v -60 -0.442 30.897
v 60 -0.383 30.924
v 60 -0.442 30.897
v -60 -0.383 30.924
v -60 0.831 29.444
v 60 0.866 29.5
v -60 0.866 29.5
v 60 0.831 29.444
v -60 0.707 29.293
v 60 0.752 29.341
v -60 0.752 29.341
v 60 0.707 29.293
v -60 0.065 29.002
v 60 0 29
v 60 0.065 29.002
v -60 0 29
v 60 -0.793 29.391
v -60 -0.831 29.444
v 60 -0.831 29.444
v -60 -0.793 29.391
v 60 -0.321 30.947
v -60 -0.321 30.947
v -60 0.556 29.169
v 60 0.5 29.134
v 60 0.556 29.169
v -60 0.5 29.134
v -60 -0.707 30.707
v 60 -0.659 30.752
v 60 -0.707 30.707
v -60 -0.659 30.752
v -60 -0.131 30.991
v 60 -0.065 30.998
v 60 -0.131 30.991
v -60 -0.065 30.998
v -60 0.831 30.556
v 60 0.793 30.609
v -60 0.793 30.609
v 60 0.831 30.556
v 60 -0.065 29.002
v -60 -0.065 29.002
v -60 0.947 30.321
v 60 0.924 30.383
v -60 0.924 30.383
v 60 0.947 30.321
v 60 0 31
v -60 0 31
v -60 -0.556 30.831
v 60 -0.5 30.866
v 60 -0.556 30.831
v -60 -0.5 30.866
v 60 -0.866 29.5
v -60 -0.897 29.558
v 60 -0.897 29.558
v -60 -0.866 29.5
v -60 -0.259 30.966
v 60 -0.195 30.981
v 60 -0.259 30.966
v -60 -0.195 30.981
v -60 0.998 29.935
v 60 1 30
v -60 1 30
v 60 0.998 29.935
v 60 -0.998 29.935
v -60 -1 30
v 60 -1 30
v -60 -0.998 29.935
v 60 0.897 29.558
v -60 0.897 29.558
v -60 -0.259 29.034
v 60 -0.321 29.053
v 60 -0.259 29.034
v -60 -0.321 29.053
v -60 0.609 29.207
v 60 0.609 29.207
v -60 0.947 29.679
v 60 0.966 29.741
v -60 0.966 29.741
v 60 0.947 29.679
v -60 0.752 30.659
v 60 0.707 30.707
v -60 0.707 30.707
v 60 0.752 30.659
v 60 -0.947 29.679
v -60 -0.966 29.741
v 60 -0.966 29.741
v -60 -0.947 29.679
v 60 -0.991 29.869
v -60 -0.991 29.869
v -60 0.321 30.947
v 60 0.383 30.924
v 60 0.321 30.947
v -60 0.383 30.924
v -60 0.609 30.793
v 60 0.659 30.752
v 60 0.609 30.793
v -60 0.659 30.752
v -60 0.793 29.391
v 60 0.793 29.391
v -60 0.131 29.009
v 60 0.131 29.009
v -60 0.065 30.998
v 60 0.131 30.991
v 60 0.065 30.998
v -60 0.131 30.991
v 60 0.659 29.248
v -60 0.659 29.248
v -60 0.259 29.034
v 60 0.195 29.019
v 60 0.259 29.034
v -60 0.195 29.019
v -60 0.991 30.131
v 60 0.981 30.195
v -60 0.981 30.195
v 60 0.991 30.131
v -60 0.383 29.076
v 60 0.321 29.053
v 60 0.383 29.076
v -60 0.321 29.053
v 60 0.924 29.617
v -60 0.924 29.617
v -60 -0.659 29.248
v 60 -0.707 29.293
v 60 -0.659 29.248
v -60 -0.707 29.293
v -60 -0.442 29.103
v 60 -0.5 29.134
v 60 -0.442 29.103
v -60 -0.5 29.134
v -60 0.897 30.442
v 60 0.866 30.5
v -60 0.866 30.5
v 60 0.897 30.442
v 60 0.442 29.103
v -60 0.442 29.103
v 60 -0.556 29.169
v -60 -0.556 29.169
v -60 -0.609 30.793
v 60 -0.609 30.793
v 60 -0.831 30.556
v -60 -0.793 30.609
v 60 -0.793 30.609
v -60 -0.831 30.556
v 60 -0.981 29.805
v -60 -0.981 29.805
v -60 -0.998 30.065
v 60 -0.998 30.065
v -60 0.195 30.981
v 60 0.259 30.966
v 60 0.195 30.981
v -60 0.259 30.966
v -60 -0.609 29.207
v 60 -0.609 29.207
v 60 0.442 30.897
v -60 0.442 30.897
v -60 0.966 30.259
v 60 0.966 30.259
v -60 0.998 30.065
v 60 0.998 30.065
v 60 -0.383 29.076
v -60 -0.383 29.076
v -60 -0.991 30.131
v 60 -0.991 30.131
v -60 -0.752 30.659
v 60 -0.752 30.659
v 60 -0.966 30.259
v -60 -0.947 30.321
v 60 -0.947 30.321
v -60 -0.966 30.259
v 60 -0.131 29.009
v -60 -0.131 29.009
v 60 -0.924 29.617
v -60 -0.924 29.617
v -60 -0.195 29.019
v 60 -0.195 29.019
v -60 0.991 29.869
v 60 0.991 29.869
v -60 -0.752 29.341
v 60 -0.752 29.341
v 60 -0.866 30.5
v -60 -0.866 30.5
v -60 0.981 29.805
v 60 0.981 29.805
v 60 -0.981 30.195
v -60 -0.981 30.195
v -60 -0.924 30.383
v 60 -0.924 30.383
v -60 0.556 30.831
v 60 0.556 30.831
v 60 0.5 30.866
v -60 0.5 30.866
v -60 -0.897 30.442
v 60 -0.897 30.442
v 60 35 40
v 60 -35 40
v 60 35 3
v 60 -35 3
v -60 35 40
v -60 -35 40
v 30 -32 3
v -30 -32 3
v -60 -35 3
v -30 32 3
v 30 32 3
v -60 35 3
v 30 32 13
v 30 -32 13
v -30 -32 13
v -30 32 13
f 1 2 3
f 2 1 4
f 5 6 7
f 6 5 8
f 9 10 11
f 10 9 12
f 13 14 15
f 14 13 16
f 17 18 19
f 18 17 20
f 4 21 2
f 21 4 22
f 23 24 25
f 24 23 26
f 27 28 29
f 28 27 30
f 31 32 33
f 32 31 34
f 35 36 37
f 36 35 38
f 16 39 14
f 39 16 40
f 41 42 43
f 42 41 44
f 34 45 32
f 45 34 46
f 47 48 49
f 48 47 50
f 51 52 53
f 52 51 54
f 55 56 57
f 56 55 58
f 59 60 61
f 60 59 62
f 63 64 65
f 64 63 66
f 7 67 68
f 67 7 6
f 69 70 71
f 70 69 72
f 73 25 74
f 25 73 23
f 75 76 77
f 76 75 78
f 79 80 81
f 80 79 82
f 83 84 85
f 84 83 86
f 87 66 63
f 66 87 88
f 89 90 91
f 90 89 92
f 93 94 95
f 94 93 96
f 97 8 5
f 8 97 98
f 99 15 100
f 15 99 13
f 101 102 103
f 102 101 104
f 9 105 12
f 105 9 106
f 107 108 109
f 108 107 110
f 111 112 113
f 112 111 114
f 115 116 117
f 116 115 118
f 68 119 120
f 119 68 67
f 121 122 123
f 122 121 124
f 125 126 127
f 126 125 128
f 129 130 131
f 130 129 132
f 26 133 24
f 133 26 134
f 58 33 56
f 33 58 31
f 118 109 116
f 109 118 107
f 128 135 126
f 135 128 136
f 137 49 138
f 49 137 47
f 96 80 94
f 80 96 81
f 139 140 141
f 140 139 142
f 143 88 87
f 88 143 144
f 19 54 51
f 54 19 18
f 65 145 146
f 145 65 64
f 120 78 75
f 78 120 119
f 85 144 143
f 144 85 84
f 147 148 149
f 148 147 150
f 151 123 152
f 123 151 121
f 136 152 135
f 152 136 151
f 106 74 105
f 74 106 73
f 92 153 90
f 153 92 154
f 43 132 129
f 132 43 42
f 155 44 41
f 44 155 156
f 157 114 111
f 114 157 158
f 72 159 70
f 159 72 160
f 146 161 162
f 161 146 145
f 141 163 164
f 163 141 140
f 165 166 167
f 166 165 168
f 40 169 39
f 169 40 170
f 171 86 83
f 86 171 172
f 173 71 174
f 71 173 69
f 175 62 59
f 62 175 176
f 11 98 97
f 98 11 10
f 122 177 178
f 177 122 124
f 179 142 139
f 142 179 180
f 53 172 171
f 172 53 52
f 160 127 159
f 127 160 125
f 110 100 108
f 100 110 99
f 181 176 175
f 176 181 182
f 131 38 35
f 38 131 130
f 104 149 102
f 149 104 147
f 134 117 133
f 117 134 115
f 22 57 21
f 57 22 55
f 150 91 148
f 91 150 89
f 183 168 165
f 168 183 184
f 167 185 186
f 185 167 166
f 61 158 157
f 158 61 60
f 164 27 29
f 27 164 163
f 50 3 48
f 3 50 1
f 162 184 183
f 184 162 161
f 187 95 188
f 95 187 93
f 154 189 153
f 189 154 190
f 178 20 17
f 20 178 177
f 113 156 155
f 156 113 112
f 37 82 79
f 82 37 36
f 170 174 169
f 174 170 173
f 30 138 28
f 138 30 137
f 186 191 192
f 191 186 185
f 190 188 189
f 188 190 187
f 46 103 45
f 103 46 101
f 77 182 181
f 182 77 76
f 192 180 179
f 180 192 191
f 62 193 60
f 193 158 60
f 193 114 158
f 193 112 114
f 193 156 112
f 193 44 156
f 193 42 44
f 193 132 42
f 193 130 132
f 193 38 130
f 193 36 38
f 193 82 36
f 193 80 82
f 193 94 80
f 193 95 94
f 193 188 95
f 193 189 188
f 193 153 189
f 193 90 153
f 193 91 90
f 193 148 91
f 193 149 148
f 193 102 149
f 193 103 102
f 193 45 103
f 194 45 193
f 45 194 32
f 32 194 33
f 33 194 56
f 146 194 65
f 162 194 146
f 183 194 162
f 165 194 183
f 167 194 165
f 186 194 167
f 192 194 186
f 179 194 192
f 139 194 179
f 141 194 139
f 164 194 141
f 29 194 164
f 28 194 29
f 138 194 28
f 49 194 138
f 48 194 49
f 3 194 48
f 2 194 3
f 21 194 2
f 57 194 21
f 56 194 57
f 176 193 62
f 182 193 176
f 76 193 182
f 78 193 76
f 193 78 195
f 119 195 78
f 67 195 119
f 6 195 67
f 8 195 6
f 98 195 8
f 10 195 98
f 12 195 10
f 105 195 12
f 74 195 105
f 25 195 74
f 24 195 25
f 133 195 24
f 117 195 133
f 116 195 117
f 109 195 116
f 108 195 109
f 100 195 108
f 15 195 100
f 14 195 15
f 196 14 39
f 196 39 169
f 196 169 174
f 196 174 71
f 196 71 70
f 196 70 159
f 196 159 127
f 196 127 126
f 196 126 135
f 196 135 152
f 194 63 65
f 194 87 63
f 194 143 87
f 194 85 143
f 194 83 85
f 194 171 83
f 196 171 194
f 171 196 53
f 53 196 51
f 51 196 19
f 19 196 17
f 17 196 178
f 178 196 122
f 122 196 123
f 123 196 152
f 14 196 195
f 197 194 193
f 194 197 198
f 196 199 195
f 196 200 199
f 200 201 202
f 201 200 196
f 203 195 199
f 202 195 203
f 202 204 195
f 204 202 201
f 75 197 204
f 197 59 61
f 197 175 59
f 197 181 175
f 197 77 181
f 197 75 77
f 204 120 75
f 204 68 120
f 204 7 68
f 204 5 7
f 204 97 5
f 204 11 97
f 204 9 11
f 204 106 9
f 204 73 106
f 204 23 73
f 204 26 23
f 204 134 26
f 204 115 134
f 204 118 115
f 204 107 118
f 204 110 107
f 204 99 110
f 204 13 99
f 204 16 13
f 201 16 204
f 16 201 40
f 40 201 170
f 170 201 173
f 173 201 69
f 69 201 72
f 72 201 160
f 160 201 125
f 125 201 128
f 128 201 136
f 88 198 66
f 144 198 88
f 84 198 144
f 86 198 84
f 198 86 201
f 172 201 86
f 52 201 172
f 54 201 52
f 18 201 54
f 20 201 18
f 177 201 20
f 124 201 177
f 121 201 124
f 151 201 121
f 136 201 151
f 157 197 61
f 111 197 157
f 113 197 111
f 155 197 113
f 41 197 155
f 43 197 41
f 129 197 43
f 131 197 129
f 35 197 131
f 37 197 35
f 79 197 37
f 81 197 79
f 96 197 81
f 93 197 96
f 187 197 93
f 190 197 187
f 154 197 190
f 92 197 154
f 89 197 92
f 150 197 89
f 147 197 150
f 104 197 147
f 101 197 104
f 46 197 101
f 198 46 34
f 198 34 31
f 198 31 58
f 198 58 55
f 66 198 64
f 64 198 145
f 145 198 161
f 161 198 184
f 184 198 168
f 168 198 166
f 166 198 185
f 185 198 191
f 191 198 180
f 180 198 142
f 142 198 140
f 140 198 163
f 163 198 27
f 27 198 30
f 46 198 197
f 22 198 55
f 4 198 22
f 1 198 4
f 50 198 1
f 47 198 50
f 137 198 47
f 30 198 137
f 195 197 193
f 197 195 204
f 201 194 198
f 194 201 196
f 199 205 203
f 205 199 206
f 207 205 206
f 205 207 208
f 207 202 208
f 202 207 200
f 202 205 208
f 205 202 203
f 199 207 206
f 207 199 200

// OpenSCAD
// Mini horizontal gel-electrophoresis buffer tank
// Print orientation: open top facing up, resting on XY plane at z = 0

// ---------------- Parameters ----------------
tank_x      = 120;   // outer length in X (mm)
tank_y      = 70;    // outer width in Y (mm)
tank_h      = 40;    // outer height in Z (mm)
wall        = 3;     // wall thickness (mm)
floor       = 3;     // floor thickness (mm)

platform_x  = 60;    // platform length in X (mm), centred
platform_y  = tank_y - 2 * wall;  // platform spans full inner width
platform_top = floor + 10;  // platform top height (z = 13)

hole_d      = 2;     // electrode hole diameter (mm)
hole_y      = 0;     // electrode hole Y position (mm)
hole_z      = 30;    // electrode hole Z position (mm)

eps         = 0.5;   // cutter overshoot past faces (mm)

$fn = 96;

// ---------------- Model ----------------
difference() {
    // Main tank body
    translate([-tank_x/2, -tank_y/2, floor])
        cube([tank_x, tank_y, tank_h - floor]);

    // Raised platform in the middle (divides bottom into two chambers)
    translate([-platform_x/2, -platform_y/2, floor])
        cube([platform_x, platform_y, platform_top - floor]);

    // Horizontal electrode holes through each end wall, along X
    for (s = [-1, 1])
        translate([s > 0 ? tank_x/2 - eps : -tank_x/2 - eps, hole_y, hole_z])
            rotate([0, 90, 0])
                cylinder(d = hole_d, h = tank_x + 2*eps);
}
